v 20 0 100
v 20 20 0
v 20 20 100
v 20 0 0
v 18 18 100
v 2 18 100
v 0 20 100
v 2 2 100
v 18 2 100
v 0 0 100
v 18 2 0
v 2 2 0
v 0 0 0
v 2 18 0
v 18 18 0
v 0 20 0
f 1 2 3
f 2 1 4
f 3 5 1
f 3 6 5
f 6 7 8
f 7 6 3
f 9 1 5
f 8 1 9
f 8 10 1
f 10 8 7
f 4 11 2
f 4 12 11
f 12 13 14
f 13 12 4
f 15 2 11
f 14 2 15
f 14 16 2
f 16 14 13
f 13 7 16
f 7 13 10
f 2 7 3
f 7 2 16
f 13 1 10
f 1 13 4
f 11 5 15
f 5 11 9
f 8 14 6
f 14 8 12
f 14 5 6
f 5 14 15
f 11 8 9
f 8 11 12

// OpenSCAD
$fn = 64;

outer_w = 20;
outer_h = 20;
wall = 2;
length = 100;

inner_w = outer_w - 2*wall;
inner_h = outer_h - 2*wall;

difference() {
  cube([outer_w, outer_h, length], center=false);
  translate([wall, wall, -0.1])
    cube([inner_w, inner_h, length + 0.2], center=false);
}
